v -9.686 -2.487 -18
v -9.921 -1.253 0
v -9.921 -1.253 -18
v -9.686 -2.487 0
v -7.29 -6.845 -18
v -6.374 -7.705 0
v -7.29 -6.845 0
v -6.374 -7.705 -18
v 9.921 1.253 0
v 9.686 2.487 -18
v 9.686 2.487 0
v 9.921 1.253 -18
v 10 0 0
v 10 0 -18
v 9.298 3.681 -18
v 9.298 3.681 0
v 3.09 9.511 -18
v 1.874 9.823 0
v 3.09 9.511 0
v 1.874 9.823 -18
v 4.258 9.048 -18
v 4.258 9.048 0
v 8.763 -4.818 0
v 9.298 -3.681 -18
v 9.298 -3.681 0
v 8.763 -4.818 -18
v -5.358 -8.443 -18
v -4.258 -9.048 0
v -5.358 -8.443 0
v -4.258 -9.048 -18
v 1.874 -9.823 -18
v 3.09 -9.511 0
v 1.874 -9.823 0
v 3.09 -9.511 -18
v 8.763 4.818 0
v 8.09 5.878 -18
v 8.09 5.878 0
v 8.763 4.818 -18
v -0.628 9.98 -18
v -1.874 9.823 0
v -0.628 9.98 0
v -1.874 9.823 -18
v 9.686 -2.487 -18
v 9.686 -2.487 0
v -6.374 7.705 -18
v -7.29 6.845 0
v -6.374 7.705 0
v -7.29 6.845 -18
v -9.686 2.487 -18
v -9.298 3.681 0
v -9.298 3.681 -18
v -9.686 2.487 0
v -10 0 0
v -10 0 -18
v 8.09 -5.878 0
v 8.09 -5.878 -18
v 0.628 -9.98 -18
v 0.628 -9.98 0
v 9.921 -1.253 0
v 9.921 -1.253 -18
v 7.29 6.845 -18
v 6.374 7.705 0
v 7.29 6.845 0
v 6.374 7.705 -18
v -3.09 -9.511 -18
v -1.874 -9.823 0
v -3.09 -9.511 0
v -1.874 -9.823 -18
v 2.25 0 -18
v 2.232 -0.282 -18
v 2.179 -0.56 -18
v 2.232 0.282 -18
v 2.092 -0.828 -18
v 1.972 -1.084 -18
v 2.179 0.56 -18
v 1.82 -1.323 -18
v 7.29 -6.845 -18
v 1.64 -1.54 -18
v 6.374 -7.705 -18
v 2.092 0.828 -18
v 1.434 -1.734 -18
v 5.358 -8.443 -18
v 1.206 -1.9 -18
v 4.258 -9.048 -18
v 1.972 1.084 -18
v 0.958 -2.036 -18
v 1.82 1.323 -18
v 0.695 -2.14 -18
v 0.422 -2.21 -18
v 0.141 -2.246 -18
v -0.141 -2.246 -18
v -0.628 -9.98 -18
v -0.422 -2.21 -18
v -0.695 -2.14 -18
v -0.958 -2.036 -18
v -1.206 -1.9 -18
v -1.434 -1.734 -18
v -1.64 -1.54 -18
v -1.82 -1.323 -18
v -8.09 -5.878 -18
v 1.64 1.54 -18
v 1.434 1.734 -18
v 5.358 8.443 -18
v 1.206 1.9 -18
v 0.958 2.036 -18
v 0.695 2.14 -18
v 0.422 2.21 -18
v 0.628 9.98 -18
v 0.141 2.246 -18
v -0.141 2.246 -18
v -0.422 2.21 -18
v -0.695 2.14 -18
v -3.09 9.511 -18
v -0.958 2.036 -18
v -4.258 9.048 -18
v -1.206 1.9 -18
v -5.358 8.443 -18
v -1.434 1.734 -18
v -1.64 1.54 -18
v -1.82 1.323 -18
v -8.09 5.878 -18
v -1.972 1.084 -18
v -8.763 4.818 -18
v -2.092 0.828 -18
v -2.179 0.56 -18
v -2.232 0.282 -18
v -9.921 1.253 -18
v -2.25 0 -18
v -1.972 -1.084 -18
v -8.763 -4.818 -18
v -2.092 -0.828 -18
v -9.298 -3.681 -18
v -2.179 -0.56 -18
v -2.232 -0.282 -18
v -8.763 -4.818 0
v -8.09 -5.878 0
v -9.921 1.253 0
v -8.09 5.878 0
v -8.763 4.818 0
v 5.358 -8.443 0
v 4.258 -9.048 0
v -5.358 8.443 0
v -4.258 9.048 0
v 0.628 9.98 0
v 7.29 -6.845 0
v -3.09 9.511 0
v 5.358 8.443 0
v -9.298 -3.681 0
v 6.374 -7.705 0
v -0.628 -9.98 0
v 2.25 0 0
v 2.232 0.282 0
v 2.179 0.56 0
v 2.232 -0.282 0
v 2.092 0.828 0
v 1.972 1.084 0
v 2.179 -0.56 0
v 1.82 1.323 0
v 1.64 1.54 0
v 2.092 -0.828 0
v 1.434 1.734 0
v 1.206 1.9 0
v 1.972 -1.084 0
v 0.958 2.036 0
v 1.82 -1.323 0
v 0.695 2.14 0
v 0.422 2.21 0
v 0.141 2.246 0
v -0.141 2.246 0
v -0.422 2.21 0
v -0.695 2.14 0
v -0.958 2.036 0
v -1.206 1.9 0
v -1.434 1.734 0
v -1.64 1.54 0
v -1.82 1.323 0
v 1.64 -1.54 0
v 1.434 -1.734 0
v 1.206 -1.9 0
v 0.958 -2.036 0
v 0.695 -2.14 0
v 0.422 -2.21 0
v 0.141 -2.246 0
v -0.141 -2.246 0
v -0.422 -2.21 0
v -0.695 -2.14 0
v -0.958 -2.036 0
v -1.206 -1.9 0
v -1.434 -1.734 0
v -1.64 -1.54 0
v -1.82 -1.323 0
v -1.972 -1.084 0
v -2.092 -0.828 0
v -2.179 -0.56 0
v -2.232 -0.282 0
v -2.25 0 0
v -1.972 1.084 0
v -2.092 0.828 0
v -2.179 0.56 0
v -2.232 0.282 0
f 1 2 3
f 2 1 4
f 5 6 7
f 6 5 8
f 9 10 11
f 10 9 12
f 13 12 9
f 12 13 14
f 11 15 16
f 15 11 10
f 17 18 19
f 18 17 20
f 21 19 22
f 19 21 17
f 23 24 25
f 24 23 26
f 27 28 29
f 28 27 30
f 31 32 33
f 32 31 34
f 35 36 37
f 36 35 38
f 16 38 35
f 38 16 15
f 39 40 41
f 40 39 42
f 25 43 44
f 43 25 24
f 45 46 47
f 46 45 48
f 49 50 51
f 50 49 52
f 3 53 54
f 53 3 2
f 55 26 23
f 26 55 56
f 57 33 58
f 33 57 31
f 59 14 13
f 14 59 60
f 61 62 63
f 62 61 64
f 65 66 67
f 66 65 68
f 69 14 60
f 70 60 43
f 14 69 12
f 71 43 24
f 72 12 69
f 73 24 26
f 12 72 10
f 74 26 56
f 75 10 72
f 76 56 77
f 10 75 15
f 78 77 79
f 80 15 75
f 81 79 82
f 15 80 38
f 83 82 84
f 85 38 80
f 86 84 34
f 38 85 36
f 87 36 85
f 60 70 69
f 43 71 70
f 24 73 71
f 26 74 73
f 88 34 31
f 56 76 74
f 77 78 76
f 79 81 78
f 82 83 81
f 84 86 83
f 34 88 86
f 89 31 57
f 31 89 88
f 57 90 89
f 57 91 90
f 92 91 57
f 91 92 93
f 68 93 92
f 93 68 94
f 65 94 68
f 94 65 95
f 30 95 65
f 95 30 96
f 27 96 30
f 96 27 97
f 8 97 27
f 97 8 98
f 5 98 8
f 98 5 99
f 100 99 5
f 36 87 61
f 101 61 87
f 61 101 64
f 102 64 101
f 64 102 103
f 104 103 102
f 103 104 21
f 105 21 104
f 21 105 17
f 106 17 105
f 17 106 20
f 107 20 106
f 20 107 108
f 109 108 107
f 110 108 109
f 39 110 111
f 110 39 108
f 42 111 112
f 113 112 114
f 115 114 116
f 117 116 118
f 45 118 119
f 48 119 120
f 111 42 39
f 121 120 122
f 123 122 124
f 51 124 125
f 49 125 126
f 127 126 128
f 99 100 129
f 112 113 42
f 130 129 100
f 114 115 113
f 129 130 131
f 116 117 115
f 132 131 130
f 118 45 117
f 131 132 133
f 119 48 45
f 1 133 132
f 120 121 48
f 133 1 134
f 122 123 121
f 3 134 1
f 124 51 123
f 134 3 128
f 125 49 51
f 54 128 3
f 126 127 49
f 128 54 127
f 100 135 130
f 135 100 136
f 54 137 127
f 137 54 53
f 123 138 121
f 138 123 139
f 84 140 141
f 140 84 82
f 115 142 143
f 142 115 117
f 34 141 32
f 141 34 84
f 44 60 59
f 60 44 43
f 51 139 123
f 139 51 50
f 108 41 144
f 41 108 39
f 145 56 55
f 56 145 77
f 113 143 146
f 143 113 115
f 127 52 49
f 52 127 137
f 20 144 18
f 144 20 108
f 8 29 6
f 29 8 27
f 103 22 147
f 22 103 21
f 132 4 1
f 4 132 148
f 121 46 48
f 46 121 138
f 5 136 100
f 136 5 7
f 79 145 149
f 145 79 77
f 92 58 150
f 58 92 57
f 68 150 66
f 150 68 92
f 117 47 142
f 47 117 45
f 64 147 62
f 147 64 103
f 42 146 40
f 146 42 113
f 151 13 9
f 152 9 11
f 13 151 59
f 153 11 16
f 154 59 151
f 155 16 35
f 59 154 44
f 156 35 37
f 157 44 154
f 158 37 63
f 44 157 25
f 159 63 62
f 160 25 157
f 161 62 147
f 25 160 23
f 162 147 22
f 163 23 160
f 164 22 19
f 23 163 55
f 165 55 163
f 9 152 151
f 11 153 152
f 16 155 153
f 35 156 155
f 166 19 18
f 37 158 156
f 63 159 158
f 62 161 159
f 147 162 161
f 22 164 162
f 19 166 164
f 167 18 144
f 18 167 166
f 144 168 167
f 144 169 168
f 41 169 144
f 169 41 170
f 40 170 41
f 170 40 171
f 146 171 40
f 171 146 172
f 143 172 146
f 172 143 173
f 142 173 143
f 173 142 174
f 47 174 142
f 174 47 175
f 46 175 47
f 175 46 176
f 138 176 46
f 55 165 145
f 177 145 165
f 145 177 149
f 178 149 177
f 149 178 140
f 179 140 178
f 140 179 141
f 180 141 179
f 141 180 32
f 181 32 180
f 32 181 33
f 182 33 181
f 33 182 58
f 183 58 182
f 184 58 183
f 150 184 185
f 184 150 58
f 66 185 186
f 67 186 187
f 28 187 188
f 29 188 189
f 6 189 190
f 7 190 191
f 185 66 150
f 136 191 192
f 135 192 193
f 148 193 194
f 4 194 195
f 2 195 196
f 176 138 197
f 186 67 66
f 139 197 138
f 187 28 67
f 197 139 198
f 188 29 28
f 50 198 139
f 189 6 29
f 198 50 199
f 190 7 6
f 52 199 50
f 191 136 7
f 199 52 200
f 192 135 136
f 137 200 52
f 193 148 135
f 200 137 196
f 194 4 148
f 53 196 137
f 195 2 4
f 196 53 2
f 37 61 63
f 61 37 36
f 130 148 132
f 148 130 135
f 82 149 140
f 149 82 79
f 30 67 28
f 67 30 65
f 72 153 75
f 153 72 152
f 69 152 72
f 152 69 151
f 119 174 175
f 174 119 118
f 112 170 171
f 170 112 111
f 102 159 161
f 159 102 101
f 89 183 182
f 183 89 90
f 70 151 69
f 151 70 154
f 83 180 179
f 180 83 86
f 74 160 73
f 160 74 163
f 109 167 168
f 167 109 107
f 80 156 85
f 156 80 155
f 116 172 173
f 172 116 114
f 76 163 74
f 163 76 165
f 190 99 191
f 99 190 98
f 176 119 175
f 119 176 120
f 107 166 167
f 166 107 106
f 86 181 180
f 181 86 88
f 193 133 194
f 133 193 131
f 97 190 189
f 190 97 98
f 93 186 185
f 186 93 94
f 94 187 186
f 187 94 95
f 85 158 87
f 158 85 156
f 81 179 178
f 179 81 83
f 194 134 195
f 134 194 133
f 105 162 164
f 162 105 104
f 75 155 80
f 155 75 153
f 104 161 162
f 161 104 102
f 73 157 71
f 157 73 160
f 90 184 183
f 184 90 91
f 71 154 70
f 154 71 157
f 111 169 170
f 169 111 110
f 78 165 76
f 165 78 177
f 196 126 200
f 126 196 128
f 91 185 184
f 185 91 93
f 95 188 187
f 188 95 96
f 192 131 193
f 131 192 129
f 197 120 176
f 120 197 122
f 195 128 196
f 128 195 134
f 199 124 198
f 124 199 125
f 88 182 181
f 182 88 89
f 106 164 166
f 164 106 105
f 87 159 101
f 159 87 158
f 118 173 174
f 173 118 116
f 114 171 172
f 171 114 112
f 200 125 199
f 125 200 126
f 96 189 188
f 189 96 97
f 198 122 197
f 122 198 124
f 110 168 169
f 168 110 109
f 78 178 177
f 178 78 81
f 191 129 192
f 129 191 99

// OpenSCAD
$fn = 50;


difference() {
	union() {
		translate(v = [0, 0, -18.0000000000]) {
			cylinder(h = 18, r = 10.0000000000);
		}
		cylinder(h = 0, r = 16.0000000000);
	}
	union() {
		#translate(v = [0, 0, -18]) {
			cylinder(h = 18, r = 2.2500000000);
		}
	}
}
